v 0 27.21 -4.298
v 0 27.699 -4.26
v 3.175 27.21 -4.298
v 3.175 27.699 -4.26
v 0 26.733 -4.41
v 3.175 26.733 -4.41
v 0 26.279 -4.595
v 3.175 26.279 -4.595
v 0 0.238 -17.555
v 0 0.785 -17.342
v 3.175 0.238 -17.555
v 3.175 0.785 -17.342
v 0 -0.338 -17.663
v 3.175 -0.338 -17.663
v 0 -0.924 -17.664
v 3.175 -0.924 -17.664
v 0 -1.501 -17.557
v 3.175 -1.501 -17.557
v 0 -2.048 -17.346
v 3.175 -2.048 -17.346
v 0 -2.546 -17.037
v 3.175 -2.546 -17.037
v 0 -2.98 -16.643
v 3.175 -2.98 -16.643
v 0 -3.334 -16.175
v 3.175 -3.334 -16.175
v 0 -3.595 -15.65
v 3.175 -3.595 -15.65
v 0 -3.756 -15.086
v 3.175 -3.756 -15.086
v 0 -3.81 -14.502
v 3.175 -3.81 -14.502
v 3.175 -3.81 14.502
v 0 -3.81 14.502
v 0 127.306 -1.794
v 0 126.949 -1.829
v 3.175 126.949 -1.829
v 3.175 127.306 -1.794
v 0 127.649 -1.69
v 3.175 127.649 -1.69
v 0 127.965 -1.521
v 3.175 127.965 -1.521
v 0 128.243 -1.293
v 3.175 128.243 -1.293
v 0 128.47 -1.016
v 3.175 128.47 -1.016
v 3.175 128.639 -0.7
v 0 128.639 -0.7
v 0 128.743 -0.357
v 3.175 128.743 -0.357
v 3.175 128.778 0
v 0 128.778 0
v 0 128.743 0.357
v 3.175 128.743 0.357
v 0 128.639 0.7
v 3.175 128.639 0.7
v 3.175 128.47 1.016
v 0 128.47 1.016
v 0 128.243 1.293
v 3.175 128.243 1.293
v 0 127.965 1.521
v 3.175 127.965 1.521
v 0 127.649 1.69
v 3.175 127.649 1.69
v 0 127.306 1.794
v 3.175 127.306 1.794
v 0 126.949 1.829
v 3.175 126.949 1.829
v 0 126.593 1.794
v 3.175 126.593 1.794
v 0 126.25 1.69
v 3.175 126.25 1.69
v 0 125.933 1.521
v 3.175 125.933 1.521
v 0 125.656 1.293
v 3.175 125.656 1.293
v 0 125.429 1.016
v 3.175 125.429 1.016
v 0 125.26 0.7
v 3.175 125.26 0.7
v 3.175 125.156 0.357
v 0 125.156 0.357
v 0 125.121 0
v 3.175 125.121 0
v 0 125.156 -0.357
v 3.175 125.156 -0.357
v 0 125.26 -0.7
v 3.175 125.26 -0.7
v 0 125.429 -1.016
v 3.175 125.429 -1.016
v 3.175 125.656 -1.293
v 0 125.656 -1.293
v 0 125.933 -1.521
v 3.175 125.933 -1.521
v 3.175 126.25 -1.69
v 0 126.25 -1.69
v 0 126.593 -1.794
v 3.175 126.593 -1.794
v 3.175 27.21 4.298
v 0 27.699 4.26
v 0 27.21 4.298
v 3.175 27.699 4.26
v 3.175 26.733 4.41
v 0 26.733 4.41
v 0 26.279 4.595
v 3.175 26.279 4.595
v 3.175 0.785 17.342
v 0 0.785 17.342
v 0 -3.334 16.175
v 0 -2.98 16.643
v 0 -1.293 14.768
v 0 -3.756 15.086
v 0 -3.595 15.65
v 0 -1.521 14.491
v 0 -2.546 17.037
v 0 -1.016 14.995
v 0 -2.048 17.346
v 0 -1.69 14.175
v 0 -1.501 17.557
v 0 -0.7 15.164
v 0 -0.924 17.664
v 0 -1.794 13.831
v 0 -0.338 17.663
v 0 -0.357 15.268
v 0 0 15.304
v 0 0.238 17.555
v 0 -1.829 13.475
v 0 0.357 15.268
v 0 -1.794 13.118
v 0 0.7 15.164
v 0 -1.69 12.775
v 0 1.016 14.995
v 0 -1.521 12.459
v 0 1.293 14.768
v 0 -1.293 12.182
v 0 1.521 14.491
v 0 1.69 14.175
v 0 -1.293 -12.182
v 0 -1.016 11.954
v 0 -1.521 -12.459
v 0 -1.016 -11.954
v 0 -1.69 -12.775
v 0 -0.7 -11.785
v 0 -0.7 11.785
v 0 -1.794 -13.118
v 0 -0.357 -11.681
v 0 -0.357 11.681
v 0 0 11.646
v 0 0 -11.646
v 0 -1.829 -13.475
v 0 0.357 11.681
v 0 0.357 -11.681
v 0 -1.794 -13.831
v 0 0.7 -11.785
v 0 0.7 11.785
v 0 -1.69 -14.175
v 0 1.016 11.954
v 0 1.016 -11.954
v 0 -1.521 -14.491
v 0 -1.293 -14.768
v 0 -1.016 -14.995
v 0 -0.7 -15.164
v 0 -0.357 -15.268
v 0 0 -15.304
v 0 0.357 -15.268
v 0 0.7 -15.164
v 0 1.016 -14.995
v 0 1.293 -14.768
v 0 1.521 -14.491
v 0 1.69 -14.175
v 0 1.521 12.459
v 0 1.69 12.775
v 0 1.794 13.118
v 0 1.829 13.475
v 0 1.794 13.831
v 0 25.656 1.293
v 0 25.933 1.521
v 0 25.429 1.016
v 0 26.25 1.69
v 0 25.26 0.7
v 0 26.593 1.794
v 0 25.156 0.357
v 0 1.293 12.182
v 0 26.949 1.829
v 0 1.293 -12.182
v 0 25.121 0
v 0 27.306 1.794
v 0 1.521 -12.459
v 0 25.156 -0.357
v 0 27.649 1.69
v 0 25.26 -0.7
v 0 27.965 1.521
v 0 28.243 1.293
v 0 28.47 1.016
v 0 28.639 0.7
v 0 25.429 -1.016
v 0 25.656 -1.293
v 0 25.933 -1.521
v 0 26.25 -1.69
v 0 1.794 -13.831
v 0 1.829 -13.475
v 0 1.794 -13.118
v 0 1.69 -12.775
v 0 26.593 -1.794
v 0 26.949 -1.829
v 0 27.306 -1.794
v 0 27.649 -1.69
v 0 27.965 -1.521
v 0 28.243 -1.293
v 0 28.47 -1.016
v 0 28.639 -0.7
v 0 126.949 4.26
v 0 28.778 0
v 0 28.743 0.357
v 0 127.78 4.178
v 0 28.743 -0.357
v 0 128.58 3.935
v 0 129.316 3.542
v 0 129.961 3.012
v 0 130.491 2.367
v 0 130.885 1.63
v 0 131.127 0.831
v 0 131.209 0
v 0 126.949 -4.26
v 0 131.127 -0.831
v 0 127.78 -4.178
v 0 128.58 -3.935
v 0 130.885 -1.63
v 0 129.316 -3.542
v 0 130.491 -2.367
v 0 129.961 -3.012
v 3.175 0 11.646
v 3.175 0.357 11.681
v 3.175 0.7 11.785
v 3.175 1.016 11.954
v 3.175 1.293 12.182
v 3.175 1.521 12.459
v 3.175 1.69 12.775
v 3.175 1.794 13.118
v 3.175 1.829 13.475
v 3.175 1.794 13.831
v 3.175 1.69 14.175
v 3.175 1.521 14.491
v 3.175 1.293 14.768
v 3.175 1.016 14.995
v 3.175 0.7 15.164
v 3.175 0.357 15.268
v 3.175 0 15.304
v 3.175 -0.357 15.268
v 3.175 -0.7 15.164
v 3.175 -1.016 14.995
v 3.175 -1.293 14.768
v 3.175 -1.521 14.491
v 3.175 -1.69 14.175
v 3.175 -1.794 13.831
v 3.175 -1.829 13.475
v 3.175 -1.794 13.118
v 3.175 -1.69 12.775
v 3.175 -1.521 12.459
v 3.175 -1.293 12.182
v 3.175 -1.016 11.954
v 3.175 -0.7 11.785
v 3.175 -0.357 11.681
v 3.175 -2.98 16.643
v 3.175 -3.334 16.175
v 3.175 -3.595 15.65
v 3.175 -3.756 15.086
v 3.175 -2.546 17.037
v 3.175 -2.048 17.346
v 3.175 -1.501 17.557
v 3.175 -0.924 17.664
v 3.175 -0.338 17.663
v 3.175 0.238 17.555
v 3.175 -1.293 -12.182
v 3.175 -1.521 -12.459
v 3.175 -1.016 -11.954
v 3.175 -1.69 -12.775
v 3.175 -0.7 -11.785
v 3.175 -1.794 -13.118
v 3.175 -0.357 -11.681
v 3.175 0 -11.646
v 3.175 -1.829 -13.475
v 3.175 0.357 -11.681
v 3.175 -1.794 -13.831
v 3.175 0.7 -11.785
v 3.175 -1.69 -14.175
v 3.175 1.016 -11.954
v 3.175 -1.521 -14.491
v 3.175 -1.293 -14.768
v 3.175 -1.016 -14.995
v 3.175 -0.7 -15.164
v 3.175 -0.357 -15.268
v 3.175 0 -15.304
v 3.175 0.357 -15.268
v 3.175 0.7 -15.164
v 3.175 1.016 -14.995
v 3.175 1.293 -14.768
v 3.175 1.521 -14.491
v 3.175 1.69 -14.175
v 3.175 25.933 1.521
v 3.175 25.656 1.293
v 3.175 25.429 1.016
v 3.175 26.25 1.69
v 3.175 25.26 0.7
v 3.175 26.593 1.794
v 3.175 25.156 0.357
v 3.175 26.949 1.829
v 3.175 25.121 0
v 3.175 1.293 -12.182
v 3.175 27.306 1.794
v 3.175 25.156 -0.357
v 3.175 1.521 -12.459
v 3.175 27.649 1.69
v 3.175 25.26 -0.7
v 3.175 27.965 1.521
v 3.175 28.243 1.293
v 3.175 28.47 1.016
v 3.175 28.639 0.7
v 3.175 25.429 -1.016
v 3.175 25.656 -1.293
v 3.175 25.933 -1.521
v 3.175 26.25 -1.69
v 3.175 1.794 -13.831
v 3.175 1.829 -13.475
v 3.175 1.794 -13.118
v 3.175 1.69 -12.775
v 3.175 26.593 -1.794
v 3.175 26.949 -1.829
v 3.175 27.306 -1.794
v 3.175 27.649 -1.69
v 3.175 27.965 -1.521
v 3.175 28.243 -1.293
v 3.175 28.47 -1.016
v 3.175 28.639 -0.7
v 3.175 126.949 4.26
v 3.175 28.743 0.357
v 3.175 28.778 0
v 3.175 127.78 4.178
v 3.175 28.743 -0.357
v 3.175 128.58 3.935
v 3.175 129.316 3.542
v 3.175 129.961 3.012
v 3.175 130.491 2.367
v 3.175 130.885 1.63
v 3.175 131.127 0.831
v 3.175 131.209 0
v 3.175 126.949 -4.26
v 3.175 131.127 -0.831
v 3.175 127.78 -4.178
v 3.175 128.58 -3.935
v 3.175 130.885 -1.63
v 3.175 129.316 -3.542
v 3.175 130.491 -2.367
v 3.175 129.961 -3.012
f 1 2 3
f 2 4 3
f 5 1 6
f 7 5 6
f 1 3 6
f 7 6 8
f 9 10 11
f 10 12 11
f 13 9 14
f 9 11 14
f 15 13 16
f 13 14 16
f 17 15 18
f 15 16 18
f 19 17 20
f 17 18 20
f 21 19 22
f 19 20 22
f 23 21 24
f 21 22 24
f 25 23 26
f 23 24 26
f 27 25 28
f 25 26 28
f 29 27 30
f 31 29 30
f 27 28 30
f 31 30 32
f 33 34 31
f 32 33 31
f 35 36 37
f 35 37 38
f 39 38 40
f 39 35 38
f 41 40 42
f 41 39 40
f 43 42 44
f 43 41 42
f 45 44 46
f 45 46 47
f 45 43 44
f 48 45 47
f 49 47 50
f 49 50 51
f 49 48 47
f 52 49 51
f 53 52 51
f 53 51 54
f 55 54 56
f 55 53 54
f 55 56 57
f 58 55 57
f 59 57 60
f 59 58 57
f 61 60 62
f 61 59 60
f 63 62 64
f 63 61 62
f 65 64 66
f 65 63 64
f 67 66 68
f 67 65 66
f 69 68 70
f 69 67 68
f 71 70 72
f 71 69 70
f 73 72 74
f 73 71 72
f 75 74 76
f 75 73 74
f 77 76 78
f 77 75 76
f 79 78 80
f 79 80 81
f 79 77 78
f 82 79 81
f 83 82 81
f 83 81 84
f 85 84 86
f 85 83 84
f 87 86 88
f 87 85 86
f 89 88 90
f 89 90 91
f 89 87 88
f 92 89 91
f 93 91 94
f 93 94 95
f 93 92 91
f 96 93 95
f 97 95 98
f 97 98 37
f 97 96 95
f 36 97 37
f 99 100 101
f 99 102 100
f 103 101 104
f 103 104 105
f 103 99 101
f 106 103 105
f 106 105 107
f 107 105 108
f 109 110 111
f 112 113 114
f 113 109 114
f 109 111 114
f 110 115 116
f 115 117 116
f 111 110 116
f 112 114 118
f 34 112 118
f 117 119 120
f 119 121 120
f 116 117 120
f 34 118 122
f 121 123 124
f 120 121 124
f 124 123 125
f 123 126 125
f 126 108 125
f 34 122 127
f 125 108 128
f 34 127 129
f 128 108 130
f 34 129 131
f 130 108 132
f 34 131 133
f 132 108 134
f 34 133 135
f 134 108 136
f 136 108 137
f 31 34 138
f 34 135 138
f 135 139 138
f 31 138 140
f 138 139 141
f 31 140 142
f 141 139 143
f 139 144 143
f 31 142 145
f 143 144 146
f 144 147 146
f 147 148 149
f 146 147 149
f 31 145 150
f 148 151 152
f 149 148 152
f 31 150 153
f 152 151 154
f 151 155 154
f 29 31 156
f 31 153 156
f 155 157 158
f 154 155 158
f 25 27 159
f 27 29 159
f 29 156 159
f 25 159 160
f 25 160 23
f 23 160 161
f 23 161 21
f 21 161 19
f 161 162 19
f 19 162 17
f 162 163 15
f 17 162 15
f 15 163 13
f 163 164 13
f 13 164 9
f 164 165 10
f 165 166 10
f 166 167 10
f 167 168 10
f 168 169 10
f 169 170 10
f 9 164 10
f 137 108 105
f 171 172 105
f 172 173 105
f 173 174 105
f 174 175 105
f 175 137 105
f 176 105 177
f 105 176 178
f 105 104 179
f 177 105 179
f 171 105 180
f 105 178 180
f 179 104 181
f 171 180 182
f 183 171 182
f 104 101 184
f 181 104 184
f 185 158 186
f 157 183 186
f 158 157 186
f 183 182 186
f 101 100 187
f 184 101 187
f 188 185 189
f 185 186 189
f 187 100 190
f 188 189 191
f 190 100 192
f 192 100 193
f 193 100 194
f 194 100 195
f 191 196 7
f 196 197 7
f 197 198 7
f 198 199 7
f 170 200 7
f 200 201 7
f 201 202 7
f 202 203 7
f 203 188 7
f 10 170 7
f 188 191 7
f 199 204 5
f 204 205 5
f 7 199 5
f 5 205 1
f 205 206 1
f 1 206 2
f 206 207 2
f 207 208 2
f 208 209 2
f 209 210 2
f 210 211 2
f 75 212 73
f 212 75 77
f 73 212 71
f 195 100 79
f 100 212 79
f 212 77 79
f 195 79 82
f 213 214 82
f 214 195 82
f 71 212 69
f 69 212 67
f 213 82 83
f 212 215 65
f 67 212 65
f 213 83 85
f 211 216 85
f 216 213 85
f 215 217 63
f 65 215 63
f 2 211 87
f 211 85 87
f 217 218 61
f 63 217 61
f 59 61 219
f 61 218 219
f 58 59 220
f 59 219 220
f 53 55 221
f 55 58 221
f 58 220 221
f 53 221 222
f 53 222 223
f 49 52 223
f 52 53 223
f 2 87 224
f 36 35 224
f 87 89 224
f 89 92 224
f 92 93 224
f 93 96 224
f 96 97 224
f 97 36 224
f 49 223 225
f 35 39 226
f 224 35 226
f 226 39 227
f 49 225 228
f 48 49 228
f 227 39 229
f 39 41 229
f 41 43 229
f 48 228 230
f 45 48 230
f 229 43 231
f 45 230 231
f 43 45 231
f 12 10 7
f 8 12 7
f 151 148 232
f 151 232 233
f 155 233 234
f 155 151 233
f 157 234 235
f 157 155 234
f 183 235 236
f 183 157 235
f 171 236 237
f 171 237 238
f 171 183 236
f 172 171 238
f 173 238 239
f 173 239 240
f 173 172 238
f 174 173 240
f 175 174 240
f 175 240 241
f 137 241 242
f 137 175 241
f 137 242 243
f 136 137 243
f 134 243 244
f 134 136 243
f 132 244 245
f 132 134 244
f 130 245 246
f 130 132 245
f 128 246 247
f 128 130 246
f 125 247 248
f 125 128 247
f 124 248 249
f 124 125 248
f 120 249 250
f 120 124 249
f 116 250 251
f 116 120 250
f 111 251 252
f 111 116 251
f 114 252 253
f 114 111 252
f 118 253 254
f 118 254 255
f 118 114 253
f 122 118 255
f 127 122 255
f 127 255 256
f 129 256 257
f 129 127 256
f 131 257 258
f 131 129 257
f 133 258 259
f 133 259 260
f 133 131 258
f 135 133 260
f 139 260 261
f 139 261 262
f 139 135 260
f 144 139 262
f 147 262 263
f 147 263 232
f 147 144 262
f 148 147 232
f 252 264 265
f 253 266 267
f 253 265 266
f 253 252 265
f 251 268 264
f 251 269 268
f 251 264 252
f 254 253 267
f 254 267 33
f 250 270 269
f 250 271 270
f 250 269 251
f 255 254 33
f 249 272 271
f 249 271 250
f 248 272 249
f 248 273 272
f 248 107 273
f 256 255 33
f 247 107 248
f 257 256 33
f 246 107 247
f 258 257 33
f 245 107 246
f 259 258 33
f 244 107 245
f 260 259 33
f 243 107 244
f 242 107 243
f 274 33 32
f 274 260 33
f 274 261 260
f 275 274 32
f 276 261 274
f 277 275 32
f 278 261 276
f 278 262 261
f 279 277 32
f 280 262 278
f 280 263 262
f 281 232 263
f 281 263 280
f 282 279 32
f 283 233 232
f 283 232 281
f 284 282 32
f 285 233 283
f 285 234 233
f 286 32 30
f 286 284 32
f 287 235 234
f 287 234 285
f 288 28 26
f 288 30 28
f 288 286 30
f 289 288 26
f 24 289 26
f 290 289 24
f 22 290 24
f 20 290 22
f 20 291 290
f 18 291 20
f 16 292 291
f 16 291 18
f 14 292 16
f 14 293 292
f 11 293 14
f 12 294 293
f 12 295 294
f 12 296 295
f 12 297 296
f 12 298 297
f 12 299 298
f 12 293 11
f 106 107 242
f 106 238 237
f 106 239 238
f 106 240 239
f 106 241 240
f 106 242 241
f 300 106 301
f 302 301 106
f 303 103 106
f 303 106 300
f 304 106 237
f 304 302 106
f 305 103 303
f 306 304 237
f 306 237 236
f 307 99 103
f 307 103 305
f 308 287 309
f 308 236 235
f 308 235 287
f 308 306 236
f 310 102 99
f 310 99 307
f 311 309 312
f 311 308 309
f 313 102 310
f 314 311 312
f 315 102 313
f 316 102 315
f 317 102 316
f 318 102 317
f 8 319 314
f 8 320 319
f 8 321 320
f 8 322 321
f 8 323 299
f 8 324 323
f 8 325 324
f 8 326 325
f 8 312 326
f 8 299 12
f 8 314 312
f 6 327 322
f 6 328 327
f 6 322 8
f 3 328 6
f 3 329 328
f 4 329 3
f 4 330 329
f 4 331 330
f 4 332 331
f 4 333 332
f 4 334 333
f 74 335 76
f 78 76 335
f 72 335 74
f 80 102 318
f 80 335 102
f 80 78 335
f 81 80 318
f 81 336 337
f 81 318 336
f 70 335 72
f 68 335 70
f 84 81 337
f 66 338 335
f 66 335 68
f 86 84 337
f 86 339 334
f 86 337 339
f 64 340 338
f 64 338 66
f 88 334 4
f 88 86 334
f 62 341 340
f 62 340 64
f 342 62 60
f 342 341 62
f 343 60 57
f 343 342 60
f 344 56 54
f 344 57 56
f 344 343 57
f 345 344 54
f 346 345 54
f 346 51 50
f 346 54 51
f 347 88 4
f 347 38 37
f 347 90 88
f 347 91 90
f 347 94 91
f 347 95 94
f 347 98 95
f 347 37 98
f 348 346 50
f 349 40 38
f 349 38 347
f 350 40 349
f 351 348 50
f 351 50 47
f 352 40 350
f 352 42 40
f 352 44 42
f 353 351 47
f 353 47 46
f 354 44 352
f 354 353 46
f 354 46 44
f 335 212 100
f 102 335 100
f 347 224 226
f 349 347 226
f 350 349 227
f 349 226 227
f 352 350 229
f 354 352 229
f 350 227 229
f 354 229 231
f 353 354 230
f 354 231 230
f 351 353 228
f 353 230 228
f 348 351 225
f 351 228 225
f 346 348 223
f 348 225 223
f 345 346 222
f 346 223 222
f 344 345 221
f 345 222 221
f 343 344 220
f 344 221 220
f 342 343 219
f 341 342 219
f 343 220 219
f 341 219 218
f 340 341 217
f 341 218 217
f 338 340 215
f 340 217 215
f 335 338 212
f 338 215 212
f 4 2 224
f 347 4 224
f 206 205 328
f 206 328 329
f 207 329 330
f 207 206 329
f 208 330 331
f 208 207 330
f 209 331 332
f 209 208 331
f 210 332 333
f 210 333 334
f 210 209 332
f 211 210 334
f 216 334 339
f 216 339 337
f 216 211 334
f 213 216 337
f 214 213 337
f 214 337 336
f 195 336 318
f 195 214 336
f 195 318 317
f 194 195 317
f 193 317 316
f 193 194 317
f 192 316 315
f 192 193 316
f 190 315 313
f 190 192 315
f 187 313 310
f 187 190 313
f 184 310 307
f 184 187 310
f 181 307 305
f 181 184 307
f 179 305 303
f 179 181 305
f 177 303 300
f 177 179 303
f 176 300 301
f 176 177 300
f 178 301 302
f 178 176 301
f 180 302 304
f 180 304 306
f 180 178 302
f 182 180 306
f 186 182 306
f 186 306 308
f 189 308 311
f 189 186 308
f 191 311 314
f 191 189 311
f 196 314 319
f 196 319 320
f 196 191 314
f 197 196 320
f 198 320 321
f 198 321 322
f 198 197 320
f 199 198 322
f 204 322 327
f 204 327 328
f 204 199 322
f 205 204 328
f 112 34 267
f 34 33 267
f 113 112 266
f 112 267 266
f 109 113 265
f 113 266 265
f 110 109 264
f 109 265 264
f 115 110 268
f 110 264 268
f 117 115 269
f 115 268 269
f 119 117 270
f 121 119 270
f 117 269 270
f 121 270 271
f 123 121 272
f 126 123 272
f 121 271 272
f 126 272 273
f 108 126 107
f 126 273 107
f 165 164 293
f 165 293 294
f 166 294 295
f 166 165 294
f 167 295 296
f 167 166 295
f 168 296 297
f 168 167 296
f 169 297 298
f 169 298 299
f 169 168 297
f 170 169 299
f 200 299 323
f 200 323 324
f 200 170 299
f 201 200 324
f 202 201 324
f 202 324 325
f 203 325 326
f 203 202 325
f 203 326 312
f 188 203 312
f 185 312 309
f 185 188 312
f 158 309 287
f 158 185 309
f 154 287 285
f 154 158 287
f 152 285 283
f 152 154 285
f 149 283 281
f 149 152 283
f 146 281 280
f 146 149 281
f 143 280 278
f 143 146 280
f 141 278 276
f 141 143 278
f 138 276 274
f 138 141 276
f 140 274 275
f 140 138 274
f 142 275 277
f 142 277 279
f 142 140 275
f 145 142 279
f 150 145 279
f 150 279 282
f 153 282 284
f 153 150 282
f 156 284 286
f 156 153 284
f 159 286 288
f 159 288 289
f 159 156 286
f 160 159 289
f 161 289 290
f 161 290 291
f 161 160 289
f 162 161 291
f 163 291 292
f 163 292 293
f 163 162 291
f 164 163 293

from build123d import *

# Parameters (mm, degrees)
SKETCH1_R           = 1.8288
BOSS_EXTRUDE1_DEPTH = 3.175
FILLET1_R           = 3.175


with BuildPart() as part:
    # Sketch1 → Boss-Extrude1 (new body)
    # profile 1 of 3: a face of its own
    with BuildSketch(Plane(origin=(0, 0, 0), x_dir=(0, 0, -1), z_dir=(1, 0, 0))):
        with BuildLine():
            Line((-19.639409497, -3.81), (19.639409497, -3.81))
            Line((19.639409497, -3.81), (4.259709497, 26.9494))
            ThreePointArc((4.259709497, 26.9494), (0, 22.689690503), (-4.259709497, 26.9494))
            Line((-4.259709497, 26.9494), (-19.639409497, -3.81))
        make_face()
        with Locations((-13.4747, 0)):
            Circle(SKETCH1_R, mode=Mode.SUBTRACT)
        with Locations((13.4747, 0)):
            Circle(SKETCH1_R, mode=Mode.SUBTRACT)
    # profile 2 of 3: a face of its own
    with BuildSketch(Plane(origin=(0, 0, 0), x_dir=(0, 0, -1), z_dir=(1, 0, 0))):
        with BuildLine():
            ThreePointArc((-4.259709497, 26.9494), (0, 22.689690503), (4.259709497, 26.9494))
            Line((4.259709497, 26.9494), (0, 35.468818994))
            Line((0, 35.468818994), (-4.259709497, 26.9494))
        make_face()
        with Locations((0, 26.9494)):
            Circle(SKETCH1_R, mode=Mode.SUBTRACT)
    # profile 3 of 3: a face of its own
    with BuildSketch(Plane(origin=(0, 0, 0), x_dir=(0, 0, -1), z_dir=(1, 0, 0))):
        with BuildLine():
            Line((0, 35.468818994), (4.259709497, 26.9494))
            Line((4.259709497, 26.9494), (4.259709497, 126.9494))
            ThreePointArc((4.259709497, 126.9494), (0, 131.209109497), (-4.259709497, 126.9494))
            Line((-4.259709497, 126.9494), (-4.259709497, 26.9494))
            Line((-4.259709497, 26.9494), (0, 35.468818994))
        make_face()
        with Locations((0, 126.9494)):
            Circle(SKETCH1_R, mode=Mode.SUBTRACT)
    extrude(amount=BOSS_EXTRUDE1_DEPTH)

    # Fillet1
    fillet1_edges = [part.edges().sort_by_distance(p)[0] for p in [
        (1.5875, -3.81, -19.639409497),
        (1.5875, -3.81, 19.639409497),
        (1.5875, 26.9494, 4.259709497),
        (1.5875, 26.9494, -4.259709497),
    ]]
    fillet(fillet1_edges, radius=FILLET1_R)


solid = part.part
